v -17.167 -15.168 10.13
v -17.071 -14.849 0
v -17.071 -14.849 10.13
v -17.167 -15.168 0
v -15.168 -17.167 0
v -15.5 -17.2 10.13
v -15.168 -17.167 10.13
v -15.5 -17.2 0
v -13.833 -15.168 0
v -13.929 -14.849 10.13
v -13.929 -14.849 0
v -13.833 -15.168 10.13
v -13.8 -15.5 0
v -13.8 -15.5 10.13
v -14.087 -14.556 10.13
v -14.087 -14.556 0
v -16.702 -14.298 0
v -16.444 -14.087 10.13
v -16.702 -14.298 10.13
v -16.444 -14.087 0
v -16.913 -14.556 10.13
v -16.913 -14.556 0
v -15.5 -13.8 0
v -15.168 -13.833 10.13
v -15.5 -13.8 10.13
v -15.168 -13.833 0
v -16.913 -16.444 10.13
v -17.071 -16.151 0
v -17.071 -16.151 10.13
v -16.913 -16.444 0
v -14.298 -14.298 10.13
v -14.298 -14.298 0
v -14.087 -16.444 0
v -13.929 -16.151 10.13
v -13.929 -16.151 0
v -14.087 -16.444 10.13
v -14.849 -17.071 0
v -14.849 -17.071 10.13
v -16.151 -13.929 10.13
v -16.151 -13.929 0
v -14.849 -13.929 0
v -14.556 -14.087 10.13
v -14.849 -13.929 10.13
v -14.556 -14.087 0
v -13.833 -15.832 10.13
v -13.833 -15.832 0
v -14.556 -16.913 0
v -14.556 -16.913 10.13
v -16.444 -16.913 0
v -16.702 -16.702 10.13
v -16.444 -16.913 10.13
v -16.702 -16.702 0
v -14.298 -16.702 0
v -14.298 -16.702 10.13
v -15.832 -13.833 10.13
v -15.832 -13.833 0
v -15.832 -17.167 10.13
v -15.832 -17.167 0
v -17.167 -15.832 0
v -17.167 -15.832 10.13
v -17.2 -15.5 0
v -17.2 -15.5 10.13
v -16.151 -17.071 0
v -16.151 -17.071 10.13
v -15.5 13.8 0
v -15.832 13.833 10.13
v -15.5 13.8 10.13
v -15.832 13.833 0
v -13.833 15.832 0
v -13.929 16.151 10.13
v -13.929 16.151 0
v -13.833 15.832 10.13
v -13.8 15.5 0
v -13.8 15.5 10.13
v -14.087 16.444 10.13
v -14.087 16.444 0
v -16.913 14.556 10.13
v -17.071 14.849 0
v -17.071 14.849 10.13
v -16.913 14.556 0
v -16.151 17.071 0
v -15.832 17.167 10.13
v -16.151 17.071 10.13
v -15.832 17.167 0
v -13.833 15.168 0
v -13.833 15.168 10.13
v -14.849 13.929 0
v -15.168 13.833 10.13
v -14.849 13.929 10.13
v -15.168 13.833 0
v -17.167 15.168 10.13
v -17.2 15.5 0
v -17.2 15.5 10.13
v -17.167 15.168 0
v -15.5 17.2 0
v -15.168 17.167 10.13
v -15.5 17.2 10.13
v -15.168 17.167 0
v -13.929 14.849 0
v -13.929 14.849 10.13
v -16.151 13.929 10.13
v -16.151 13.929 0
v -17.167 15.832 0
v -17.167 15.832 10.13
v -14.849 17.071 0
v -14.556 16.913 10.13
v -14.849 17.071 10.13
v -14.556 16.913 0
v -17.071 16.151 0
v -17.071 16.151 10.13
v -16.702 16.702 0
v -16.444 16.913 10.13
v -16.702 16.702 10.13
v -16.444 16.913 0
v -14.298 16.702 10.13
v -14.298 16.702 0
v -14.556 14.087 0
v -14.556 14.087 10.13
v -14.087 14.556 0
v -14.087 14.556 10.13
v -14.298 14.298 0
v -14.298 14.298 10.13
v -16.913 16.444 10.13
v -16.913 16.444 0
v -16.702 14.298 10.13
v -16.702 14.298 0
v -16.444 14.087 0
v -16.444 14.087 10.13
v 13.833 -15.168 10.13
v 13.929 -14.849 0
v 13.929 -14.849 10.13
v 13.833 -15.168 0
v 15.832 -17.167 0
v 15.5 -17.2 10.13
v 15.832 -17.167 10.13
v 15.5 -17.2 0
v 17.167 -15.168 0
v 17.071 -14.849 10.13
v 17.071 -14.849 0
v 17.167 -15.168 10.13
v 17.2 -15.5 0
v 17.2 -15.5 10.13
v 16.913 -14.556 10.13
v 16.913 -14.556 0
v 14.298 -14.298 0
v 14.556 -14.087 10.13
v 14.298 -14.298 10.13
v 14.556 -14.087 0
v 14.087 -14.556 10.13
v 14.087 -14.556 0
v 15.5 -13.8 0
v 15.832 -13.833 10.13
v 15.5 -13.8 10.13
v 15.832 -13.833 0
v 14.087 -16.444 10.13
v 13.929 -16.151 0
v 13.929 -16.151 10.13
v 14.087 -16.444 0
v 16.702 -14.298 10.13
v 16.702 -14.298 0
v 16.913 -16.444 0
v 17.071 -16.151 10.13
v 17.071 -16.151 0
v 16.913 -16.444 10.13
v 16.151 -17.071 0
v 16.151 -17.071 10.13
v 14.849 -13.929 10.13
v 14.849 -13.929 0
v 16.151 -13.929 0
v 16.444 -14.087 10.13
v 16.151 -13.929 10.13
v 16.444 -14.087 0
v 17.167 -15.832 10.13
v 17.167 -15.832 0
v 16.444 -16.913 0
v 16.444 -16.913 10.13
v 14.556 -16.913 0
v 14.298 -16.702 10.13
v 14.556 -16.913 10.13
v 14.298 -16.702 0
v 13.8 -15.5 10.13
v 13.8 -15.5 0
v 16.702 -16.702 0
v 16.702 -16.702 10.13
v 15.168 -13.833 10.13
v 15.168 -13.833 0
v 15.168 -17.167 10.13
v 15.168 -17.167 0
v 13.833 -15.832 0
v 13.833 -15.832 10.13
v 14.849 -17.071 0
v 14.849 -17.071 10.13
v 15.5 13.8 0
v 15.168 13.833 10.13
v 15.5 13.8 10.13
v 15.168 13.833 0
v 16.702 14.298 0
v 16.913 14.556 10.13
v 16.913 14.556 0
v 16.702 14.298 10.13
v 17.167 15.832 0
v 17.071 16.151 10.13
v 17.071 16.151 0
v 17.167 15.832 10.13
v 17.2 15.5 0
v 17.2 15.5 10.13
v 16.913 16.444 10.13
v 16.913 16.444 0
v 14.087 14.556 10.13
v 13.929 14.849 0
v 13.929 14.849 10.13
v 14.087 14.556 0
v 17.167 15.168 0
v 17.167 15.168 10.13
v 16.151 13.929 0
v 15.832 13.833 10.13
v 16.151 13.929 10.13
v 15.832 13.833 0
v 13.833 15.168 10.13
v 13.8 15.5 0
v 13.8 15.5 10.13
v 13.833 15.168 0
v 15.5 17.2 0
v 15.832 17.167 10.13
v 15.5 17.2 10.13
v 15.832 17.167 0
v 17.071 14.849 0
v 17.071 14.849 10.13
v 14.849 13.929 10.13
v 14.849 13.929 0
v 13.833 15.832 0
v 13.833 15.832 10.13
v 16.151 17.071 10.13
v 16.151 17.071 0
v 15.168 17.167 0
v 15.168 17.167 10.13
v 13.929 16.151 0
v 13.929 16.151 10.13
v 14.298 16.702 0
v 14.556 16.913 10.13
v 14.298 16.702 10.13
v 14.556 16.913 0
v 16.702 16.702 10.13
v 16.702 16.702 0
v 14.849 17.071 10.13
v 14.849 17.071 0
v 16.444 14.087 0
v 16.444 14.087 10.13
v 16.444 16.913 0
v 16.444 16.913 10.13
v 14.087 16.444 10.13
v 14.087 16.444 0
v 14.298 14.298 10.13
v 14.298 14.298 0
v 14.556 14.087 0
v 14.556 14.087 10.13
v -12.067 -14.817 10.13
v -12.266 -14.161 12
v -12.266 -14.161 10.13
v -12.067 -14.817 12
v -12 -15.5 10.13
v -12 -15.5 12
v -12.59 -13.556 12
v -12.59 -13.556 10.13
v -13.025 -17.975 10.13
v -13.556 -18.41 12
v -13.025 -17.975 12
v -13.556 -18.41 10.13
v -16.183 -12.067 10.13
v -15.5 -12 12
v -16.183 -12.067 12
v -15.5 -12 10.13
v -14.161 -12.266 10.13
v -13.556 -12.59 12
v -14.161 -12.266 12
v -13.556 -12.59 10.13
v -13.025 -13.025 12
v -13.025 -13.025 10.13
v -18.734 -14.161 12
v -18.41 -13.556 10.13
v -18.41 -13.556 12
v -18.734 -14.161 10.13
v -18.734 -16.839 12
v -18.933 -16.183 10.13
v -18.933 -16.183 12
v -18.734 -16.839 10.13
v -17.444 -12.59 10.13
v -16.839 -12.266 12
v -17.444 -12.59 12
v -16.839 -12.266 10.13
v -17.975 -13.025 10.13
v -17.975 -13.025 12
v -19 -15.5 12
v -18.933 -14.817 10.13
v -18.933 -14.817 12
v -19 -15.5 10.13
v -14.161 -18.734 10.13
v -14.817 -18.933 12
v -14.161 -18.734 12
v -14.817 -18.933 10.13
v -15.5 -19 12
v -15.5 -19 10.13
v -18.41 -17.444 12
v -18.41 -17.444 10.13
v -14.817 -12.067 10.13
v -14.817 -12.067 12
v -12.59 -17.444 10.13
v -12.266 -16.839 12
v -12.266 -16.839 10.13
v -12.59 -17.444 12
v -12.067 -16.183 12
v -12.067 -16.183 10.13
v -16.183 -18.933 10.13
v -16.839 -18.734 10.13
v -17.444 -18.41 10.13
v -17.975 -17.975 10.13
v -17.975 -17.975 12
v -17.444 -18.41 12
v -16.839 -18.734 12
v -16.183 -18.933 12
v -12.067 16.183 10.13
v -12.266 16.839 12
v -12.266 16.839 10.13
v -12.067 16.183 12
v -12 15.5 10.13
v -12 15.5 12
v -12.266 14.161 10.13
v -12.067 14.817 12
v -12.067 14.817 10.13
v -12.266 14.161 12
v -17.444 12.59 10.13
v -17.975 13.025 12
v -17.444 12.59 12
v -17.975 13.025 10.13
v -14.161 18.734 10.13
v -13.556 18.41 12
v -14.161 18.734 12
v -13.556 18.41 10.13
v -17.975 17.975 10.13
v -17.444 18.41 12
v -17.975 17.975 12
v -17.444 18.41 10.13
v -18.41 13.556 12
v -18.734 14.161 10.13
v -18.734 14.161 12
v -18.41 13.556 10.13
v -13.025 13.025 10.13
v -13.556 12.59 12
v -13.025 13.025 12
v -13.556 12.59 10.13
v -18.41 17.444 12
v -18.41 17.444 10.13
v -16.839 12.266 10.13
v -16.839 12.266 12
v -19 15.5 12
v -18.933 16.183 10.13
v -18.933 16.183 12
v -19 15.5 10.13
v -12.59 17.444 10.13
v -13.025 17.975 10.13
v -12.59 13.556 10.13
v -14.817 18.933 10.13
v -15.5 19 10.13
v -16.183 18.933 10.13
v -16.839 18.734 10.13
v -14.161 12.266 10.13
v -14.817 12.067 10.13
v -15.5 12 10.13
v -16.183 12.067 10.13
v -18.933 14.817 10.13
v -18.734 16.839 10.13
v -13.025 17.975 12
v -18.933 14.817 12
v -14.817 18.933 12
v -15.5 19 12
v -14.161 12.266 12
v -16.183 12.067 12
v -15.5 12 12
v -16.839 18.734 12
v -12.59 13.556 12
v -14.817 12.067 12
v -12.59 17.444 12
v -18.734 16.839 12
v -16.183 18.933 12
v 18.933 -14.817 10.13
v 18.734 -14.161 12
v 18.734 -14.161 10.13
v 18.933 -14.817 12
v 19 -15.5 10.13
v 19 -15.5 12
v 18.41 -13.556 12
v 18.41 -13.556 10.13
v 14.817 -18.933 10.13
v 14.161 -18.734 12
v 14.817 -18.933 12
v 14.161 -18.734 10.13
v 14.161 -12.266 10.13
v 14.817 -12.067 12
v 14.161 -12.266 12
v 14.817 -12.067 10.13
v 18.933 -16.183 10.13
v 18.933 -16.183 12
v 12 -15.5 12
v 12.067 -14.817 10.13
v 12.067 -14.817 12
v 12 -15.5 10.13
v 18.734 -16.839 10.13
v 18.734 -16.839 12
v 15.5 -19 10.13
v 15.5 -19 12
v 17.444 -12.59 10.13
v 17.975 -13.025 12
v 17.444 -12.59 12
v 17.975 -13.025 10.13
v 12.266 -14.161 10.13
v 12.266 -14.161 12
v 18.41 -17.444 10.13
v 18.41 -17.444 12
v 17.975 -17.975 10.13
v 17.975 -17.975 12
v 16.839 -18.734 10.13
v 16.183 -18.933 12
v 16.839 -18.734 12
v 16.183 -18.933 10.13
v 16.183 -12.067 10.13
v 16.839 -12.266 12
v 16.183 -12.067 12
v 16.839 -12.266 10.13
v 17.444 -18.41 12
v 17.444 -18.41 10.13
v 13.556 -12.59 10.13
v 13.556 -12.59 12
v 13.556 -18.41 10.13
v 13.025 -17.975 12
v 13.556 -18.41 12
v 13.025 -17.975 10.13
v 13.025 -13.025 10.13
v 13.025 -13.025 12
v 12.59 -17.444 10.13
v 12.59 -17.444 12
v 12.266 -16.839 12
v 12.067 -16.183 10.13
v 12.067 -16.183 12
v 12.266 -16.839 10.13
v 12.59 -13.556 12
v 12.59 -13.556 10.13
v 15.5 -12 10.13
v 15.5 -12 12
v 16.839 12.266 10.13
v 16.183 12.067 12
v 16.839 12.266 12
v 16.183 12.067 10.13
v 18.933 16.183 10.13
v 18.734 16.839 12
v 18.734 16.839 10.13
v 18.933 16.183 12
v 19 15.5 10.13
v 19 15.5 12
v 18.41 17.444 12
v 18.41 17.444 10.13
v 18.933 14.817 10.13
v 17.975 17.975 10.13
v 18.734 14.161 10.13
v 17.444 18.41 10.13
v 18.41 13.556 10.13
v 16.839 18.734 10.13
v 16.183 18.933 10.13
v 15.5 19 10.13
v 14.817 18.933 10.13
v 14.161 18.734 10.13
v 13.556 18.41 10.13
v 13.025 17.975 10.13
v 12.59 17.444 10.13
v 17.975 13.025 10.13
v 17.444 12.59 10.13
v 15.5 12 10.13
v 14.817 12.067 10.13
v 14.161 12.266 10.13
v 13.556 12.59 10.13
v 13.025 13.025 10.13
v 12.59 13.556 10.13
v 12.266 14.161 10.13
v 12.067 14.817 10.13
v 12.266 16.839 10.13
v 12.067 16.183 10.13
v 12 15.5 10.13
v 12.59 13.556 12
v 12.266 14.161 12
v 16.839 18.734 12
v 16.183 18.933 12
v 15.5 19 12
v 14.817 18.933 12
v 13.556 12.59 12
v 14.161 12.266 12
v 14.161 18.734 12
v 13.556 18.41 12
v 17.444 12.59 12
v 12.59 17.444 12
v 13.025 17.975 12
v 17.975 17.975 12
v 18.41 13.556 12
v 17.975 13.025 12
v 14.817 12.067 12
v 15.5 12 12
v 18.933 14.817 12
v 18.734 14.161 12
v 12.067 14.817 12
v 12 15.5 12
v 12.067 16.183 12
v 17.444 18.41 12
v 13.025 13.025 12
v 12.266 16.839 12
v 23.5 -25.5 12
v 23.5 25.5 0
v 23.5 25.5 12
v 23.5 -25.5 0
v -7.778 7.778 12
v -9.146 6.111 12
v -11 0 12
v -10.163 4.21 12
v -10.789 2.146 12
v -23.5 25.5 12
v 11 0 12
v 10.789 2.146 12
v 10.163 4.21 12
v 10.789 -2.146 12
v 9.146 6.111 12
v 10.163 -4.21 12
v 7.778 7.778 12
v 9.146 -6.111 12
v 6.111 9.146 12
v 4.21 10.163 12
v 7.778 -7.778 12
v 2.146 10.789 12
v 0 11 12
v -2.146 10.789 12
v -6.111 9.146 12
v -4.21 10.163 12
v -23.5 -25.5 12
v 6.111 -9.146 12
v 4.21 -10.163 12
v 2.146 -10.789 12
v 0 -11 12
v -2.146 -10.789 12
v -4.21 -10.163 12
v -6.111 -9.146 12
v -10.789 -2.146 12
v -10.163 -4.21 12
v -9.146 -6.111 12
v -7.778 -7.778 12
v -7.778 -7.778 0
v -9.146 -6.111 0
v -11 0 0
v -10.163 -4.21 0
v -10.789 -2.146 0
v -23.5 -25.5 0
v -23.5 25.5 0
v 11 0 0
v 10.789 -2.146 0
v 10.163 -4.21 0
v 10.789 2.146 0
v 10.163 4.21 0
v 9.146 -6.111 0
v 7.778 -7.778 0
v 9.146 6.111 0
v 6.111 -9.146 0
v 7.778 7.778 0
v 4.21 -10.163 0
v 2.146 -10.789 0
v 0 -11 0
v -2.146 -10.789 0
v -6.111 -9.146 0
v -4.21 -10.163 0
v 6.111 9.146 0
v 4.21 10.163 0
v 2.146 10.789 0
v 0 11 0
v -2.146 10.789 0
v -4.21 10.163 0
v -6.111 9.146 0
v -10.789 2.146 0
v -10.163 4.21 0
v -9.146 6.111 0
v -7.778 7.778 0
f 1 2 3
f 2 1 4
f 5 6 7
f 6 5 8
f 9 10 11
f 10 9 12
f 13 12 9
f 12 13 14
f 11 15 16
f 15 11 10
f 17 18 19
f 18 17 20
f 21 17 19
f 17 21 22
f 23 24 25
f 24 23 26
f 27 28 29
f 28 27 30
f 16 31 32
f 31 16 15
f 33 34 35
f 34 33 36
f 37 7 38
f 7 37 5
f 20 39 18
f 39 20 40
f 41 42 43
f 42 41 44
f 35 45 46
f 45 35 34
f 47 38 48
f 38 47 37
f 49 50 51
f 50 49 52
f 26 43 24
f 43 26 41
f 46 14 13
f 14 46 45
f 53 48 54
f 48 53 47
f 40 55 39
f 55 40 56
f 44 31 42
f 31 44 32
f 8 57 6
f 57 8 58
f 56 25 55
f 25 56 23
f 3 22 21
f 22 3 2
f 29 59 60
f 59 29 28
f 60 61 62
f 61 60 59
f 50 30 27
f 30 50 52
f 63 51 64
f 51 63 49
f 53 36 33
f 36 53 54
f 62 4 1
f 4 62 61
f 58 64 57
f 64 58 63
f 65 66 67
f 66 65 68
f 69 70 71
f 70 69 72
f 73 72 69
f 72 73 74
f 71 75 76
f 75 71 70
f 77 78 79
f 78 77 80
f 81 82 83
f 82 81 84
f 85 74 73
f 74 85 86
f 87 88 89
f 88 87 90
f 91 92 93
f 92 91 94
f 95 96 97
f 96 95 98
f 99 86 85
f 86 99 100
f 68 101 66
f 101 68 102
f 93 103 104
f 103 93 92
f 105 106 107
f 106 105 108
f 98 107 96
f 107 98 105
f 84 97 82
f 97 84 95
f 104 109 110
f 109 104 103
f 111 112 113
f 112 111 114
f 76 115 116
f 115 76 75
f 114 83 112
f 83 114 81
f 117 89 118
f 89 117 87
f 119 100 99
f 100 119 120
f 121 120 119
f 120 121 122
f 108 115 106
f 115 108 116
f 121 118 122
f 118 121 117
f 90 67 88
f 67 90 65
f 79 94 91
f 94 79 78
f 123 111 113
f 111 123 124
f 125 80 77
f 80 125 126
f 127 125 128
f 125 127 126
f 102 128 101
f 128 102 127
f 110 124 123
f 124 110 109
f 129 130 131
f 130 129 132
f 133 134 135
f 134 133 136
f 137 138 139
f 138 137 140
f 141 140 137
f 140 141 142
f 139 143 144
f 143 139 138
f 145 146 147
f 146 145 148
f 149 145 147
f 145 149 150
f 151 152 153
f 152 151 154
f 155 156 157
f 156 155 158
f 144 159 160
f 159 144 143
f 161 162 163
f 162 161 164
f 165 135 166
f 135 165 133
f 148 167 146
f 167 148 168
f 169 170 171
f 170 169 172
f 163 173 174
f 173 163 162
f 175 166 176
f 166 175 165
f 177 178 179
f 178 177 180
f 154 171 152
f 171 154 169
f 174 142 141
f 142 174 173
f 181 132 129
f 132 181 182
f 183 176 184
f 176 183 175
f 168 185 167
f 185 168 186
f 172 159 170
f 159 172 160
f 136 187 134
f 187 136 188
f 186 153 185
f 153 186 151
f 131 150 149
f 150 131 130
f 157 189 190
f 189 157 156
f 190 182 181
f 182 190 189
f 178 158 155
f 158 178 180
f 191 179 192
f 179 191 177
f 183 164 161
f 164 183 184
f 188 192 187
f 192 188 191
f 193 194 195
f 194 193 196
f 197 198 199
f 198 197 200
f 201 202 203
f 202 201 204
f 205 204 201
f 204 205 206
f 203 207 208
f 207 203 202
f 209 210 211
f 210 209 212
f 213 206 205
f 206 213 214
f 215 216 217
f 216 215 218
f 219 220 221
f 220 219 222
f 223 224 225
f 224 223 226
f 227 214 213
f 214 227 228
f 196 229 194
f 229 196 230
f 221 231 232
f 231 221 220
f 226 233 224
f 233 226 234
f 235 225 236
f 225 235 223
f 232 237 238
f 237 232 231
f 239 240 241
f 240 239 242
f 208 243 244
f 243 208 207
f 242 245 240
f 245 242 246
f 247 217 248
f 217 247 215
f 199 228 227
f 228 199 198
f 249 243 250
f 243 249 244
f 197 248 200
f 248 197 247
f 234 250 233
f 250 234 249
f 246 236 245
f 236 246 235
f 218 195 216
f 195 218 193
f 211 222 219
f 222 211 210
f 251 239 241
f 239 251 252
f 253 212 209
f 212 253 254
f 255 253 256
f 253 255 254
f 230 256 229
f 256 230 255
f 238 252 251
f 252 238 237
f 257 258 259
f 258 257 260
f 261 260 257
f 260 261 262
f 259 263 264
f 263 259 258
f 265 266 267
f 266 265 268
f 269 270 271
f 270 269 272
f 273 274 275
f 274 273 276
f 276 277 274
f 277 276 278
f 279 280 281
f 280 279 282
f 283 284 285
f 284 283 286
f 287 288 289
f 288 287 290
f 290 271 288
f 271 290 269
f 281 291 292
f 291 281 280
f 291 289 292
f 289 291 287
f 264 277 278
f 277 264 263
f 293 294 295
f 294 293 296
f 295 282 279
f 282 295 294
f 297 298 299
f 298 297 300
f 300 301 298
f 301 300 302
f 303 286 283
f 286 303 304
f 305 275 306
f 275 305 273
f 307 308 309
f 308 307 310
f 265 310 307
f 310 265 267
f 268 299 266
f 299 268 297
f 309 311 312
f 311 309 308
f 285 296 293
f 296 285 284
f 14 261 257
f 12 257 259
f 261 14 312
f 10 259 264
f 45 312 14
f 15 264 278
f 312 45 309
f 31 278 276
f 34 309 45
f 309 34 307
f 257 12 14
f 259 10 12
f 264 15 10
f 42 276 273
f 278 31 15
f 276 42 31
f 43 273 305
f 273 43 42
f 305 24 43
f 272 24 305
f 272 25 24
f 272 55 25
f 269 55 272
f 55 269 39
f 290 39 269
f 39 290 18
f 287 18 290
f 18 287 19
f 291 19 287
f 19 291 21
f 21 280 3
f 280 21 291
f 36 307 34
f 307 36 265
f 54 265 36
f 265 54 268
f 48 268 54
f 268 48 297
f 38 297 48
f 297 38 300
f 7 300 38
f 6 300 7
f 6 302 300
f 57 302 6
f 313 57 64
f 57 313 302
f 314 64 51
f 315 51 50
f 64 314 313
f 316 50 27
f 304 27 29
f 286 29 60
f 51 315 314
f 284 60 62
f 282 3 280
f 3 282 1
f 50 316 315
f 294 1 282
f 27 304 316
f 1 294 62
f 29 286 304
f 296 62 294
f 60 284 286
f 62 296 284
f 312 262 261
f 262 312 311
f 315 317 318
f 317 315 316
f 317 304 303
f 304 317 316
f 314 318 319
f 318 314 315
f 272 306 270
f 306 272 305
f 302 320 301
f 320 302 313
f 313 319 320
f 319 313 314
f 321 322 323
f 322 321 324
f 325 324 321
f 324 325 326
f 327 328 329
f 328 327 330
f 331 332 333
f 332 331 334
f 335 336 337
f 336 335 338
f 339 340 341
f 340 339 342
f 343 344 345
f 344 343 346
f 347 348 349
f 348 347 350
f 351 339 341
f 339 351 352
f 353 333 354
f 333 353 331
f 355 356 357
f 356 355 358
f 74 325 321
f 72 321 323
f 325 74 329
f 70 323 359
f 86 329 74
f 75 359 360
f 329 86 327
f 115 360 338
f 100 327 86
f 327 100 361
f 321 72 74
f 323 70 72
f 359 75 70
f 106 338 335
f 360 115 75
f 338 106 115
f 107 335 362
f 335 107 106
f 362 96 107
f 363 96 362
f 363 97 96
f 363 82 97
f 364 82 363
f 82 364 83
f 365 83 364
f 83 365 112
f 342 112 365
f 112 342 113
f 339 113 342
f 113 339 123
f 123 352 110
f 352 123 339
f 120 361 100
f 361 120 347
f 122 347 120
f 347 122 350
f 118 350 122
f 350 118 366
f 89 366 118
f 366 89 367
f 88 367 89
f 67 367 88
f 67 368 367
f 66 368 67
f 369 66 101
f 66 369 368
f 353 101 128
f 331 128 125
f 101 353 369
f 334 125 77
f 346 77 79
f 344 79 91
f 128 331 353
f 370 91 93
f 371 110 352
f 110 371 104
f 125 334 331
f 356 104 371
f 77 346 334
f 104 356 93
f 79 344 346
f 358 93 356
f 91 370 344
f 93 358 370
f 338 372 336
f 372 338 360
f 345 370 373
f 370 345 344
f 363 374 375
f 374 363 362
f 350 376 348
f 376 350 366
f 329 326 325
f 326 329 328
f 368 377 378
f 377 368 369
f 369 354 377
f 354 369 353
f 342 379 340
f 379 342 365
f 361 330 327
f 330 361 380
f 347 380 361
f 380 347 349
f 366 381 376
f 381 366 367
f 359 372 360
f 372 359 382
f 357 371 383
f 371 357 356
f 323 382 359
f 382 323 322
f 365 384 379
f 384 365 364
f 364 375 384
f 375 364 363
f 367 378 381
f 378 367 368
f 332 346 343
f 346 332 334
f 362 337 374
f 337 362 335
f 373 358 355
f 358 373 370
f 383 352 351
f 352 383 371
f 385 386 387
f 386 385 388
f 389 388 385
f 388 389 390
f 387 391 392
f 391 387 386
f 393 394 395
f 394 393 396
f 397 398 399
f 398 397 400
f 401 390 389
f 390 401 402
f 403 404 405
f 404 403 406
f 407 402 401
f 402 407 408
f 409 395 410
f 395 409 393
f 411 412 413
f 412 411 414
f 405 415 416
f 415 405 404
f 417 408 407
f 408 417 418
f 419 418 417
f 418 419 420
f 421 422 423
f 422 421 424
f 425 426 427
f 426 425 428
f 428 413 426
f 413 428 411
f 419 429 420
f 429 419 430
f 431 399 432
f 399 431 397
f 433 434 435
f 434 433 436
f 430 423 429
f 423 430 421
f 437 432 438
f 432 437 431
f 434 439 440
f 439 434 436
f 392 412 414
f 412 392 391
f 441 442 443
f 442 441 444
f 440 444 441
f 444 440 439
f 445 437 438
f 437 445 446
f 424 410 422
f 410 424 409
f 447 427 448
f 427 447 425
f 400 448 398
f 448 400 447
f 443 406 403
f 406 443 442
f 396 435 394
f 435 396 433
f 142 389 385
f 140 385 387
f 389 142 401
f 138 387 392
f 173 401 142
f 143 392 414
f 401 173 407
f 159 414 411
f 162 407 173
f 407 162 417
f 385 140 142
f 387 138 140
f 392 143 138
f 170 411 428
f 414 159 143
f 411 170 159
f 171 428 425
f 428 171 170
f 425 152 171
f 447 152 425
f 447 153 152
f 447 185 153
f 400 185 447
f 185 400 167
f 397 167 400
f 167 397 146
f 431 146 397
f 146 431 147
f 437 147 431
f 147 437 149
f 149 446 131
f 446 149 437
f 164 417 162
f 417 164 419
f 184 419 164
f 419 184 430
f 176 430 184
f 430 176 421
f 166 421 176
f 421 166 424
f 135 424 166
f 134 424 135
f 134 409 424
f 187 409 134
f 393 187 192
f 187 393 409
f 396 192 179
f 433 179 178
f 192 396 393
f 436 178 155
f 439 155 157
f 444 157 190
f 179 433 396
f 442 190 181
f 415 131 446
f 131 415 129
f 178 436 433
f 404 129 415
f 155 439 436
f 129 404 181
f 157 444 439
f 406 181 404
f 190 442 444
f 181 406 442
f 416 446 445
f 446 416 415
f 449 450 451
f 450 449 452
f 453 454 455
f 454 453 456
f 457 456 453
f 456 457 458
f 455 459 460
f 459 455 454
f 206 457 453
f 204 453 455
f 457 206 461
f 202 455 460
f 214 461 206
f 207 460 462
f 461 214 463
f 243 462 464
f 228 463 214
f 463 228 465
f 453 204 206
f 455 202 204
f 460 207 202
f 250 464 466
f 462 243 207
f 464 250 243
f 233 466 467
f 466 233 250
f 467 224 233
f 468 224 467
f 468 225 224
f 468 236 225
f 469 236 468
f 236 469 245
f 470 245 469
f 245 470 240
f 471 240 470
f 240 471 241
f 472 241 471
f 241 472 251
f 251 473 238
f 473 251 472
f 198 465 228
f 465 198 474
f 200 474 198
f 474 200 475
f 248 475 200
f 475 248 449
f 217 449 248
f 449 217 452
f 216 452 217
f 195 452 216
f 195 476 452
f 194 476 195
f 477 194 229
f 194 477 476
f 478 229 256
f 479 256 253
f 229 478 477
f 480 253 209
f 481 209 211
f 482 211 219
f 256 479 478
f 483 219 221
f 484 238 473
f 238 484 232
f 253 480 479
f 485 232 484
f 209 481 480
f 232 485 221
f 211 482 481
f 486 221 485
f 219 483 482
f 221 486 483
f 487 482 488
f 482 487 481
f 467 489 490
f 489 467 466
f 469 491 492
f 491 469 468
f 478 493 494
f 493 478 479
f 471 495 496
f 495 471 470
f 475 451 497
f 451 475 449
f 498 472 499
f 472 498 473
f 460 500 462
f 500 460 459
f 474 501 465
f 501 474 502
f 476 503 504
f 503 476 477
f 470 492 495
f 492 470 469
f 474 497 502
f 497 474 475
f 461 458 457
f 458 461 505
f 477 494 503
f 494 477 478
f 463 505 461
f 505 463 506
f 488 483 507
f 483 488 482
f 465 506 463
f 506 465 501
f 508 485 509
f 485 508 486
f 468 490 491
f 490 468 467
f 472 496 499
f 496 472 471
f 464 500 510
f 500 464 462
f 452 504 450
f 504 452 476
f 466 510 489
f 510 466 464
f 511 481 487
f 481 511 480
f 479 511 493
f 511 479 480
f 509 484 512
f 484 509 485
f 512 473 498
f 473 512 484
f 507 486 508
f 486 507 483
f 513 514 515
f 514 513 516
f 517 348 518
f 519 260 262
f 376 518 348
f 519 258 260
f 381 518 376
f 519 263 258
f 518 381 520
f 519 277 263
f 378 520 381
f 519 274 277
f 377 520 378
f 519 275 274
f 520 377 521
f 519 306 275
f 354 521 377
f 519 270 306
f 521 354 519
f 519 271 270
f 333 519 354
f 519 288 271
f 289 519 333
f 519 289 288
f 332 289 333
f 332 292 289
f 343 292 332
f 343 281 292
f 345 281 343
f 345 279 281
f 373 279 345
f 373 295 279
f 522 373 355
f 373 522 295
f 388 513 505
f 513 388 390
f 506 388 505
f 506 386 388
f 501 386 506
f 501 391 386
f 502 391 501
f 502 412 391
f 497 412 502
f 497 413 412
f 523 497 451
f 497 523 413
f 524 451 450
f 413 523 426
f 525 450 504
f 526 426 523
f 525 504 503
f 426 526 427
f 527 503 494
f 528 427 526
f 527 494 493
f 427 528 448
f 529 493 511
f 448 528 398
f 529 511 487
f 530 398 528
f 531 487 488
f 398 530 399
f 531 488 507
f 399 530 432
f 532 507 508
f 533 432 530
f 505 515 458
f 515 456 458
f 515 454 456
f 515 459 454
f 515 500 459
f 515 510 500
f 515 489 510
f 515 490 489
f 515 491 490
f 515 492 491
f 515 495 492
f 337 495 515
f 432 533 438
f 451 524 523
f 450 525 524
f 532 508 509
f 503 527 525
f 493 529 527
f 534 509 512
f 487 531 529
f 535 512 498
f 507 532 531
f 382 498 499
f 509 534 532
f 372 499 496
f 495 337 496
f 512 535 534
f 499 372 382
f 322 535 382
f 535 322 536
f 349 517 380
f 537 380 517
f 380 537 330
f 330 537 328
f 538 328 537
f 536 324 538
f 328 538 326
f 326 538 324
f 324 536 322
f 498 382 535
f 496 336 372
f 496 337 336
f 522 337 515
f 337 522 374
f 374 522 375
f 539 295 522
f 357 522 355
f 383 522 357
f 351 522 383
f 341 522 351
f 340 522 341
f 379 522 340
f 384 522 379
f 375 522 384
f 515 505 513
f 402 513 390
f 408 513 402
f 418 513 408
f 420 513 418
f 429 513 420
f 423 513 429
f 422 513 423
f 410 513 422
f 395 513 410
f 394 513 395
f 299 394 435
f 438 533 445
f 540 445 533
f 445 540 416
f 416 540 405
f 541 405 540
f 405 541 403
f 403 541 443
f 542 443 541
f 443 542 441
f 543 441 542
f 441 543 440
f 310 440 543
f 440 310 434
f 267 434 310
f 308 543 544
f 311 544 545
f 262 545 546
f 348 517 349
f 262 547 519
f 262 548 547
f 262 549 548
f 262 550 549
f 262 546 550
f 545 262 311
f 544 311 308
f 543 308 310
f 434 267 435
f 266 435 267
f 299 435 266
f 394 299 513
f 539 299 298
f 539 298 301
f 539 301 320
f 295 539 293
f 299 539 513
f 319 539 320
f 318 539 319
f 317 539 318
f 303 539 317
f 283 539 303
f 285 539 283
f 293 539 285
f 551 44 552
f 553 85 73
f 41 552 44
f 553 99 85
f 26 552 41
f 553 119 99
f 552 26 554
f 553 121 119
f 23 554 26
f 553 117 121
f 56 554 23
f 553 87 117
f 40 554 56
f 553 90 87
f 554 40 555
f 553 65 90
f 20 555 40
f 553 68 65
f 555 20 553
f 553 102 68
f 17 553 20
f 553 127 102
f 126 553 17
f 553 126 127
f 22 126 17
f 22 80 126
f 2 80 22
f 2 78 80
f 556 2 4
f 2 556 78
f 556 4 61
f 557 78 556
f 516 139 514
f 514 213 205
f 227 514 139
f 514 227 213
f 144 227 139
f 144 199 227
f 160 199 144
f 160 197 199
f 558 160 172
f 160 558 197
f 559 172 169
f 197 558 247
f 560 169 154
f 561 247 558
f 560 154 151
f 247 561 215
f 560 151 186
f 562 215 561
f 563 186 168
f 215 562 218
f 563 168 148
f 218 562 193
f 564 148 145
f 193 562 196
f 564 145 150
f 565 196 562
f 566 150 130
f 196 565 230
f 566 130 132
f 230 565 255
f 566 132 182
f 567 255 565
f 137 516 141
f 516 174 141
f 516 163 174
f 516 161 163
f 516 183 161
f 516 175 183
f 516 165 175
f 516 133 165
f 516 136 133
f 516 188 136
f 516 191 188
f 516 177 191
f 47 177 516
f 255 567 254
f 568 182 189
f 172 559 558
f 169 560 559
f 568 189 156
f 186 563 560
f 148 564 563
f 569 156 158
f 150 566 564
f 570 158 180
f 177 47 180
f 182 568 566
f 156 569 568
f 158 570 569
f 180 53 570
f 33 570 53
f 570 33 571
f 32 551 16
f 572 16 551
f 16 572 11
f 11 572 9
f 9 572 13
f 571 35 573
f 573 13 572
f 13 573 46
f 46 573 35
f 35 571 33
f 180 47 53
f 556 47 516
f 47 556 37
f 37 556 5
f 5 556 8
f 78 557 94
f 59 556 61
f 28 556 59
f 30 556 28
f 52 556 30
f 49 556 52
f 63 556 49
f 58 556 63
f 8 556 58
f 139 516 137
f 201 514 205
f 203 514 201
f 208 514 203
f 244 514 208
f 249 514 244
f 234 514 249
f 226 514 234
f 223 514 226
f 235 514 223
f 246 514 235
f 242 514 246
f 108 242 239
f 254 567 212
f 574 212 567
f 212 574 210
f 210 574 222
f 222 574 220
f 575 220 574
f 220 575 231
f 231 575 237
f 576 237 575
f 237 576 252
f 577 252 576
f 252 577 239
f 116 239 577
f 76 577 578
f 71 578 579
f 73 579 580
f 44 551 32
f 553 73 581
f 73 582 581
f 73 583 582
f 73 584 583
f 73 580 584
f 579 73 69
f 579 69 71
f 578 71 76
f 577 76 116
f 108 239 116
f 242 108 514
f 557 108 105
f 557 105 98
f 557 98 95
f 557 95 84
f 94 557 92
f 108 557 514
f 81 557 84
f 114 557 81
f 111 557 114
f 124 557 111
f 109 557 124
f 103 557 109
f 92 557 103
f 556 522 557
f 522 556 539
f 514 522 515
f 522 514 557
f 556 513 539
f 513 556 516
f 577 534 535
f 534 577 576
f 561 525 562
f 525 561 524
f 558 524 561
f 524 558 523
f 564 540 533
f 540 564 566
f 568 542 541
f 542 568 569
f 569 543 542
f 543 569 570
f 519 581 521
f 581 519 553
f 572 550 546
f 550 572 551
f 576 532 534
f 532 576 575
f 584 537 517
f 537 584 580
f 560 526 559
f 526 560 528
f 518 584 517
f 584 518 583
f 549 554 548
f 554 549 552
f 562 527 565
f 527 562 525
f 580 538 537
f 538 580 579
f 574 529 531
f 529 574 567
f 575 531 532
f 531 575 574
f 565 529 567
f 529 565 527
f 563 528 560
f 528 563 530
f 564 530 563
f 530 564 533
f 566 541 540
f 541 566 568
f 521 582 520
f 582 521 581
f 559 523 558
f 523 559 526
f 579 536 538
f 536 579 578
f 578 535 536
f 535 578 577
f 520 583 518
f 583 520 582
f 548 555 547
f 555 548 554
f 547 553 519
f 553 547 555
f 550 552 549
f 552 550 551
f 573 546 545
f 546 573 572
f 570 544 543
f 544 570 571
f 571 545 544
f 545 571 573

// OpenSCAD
$fn = 32;

// ----------------------------------------------------------------------
// Motor mount plate: NEMA17, 47 x 51 x 12 mm
// ----------------------------------------------------------------------

// --- parameters (mm) ---
mount_w = 47;             // plate length, X
mount_d = 51;             // plate width, Y
mat_t = 12;               // plate thickness
motor_pitch = 31;         // NEMA17 bolt spacing
motor_d = 3.4;            // NEMA17 screw clearance
center_bore = 22;         // pilot boss bore
cb_d = 7;                 // counterbore seat
cb_h = 1.87;              // counterbore depth

module plate() {
  translate([-mount_w / 2, -mount_d / 2, 0]) cube([mount_w, mount_d, mat_t]);
}

module motor_holes() {
  for (sx = [-1, 1]) for (sy = [-1, 1])
    translate([sx * motor_pitch / 2, sy * motor_pitch / 2, -1])
      cylinder(h = mat_t + 2, d = motor_d);
}
module motor_counterbores() {
  for (sx = [-1, 1]) for (sy = [-1, 1])
    translate([sx * motor_pitch / 2, sy * motor_pitch / 2, mat_t - cb_h])
      cylinder(h = cb_h + 0.6, d = cb_d);
}

difference() {
  union() {
    plate();
  }
  motor_holes();
  translate([0, 0, -1]) cylinder(h = mat_t + 2, d = center_bore);
  motor_counterbores();
}
